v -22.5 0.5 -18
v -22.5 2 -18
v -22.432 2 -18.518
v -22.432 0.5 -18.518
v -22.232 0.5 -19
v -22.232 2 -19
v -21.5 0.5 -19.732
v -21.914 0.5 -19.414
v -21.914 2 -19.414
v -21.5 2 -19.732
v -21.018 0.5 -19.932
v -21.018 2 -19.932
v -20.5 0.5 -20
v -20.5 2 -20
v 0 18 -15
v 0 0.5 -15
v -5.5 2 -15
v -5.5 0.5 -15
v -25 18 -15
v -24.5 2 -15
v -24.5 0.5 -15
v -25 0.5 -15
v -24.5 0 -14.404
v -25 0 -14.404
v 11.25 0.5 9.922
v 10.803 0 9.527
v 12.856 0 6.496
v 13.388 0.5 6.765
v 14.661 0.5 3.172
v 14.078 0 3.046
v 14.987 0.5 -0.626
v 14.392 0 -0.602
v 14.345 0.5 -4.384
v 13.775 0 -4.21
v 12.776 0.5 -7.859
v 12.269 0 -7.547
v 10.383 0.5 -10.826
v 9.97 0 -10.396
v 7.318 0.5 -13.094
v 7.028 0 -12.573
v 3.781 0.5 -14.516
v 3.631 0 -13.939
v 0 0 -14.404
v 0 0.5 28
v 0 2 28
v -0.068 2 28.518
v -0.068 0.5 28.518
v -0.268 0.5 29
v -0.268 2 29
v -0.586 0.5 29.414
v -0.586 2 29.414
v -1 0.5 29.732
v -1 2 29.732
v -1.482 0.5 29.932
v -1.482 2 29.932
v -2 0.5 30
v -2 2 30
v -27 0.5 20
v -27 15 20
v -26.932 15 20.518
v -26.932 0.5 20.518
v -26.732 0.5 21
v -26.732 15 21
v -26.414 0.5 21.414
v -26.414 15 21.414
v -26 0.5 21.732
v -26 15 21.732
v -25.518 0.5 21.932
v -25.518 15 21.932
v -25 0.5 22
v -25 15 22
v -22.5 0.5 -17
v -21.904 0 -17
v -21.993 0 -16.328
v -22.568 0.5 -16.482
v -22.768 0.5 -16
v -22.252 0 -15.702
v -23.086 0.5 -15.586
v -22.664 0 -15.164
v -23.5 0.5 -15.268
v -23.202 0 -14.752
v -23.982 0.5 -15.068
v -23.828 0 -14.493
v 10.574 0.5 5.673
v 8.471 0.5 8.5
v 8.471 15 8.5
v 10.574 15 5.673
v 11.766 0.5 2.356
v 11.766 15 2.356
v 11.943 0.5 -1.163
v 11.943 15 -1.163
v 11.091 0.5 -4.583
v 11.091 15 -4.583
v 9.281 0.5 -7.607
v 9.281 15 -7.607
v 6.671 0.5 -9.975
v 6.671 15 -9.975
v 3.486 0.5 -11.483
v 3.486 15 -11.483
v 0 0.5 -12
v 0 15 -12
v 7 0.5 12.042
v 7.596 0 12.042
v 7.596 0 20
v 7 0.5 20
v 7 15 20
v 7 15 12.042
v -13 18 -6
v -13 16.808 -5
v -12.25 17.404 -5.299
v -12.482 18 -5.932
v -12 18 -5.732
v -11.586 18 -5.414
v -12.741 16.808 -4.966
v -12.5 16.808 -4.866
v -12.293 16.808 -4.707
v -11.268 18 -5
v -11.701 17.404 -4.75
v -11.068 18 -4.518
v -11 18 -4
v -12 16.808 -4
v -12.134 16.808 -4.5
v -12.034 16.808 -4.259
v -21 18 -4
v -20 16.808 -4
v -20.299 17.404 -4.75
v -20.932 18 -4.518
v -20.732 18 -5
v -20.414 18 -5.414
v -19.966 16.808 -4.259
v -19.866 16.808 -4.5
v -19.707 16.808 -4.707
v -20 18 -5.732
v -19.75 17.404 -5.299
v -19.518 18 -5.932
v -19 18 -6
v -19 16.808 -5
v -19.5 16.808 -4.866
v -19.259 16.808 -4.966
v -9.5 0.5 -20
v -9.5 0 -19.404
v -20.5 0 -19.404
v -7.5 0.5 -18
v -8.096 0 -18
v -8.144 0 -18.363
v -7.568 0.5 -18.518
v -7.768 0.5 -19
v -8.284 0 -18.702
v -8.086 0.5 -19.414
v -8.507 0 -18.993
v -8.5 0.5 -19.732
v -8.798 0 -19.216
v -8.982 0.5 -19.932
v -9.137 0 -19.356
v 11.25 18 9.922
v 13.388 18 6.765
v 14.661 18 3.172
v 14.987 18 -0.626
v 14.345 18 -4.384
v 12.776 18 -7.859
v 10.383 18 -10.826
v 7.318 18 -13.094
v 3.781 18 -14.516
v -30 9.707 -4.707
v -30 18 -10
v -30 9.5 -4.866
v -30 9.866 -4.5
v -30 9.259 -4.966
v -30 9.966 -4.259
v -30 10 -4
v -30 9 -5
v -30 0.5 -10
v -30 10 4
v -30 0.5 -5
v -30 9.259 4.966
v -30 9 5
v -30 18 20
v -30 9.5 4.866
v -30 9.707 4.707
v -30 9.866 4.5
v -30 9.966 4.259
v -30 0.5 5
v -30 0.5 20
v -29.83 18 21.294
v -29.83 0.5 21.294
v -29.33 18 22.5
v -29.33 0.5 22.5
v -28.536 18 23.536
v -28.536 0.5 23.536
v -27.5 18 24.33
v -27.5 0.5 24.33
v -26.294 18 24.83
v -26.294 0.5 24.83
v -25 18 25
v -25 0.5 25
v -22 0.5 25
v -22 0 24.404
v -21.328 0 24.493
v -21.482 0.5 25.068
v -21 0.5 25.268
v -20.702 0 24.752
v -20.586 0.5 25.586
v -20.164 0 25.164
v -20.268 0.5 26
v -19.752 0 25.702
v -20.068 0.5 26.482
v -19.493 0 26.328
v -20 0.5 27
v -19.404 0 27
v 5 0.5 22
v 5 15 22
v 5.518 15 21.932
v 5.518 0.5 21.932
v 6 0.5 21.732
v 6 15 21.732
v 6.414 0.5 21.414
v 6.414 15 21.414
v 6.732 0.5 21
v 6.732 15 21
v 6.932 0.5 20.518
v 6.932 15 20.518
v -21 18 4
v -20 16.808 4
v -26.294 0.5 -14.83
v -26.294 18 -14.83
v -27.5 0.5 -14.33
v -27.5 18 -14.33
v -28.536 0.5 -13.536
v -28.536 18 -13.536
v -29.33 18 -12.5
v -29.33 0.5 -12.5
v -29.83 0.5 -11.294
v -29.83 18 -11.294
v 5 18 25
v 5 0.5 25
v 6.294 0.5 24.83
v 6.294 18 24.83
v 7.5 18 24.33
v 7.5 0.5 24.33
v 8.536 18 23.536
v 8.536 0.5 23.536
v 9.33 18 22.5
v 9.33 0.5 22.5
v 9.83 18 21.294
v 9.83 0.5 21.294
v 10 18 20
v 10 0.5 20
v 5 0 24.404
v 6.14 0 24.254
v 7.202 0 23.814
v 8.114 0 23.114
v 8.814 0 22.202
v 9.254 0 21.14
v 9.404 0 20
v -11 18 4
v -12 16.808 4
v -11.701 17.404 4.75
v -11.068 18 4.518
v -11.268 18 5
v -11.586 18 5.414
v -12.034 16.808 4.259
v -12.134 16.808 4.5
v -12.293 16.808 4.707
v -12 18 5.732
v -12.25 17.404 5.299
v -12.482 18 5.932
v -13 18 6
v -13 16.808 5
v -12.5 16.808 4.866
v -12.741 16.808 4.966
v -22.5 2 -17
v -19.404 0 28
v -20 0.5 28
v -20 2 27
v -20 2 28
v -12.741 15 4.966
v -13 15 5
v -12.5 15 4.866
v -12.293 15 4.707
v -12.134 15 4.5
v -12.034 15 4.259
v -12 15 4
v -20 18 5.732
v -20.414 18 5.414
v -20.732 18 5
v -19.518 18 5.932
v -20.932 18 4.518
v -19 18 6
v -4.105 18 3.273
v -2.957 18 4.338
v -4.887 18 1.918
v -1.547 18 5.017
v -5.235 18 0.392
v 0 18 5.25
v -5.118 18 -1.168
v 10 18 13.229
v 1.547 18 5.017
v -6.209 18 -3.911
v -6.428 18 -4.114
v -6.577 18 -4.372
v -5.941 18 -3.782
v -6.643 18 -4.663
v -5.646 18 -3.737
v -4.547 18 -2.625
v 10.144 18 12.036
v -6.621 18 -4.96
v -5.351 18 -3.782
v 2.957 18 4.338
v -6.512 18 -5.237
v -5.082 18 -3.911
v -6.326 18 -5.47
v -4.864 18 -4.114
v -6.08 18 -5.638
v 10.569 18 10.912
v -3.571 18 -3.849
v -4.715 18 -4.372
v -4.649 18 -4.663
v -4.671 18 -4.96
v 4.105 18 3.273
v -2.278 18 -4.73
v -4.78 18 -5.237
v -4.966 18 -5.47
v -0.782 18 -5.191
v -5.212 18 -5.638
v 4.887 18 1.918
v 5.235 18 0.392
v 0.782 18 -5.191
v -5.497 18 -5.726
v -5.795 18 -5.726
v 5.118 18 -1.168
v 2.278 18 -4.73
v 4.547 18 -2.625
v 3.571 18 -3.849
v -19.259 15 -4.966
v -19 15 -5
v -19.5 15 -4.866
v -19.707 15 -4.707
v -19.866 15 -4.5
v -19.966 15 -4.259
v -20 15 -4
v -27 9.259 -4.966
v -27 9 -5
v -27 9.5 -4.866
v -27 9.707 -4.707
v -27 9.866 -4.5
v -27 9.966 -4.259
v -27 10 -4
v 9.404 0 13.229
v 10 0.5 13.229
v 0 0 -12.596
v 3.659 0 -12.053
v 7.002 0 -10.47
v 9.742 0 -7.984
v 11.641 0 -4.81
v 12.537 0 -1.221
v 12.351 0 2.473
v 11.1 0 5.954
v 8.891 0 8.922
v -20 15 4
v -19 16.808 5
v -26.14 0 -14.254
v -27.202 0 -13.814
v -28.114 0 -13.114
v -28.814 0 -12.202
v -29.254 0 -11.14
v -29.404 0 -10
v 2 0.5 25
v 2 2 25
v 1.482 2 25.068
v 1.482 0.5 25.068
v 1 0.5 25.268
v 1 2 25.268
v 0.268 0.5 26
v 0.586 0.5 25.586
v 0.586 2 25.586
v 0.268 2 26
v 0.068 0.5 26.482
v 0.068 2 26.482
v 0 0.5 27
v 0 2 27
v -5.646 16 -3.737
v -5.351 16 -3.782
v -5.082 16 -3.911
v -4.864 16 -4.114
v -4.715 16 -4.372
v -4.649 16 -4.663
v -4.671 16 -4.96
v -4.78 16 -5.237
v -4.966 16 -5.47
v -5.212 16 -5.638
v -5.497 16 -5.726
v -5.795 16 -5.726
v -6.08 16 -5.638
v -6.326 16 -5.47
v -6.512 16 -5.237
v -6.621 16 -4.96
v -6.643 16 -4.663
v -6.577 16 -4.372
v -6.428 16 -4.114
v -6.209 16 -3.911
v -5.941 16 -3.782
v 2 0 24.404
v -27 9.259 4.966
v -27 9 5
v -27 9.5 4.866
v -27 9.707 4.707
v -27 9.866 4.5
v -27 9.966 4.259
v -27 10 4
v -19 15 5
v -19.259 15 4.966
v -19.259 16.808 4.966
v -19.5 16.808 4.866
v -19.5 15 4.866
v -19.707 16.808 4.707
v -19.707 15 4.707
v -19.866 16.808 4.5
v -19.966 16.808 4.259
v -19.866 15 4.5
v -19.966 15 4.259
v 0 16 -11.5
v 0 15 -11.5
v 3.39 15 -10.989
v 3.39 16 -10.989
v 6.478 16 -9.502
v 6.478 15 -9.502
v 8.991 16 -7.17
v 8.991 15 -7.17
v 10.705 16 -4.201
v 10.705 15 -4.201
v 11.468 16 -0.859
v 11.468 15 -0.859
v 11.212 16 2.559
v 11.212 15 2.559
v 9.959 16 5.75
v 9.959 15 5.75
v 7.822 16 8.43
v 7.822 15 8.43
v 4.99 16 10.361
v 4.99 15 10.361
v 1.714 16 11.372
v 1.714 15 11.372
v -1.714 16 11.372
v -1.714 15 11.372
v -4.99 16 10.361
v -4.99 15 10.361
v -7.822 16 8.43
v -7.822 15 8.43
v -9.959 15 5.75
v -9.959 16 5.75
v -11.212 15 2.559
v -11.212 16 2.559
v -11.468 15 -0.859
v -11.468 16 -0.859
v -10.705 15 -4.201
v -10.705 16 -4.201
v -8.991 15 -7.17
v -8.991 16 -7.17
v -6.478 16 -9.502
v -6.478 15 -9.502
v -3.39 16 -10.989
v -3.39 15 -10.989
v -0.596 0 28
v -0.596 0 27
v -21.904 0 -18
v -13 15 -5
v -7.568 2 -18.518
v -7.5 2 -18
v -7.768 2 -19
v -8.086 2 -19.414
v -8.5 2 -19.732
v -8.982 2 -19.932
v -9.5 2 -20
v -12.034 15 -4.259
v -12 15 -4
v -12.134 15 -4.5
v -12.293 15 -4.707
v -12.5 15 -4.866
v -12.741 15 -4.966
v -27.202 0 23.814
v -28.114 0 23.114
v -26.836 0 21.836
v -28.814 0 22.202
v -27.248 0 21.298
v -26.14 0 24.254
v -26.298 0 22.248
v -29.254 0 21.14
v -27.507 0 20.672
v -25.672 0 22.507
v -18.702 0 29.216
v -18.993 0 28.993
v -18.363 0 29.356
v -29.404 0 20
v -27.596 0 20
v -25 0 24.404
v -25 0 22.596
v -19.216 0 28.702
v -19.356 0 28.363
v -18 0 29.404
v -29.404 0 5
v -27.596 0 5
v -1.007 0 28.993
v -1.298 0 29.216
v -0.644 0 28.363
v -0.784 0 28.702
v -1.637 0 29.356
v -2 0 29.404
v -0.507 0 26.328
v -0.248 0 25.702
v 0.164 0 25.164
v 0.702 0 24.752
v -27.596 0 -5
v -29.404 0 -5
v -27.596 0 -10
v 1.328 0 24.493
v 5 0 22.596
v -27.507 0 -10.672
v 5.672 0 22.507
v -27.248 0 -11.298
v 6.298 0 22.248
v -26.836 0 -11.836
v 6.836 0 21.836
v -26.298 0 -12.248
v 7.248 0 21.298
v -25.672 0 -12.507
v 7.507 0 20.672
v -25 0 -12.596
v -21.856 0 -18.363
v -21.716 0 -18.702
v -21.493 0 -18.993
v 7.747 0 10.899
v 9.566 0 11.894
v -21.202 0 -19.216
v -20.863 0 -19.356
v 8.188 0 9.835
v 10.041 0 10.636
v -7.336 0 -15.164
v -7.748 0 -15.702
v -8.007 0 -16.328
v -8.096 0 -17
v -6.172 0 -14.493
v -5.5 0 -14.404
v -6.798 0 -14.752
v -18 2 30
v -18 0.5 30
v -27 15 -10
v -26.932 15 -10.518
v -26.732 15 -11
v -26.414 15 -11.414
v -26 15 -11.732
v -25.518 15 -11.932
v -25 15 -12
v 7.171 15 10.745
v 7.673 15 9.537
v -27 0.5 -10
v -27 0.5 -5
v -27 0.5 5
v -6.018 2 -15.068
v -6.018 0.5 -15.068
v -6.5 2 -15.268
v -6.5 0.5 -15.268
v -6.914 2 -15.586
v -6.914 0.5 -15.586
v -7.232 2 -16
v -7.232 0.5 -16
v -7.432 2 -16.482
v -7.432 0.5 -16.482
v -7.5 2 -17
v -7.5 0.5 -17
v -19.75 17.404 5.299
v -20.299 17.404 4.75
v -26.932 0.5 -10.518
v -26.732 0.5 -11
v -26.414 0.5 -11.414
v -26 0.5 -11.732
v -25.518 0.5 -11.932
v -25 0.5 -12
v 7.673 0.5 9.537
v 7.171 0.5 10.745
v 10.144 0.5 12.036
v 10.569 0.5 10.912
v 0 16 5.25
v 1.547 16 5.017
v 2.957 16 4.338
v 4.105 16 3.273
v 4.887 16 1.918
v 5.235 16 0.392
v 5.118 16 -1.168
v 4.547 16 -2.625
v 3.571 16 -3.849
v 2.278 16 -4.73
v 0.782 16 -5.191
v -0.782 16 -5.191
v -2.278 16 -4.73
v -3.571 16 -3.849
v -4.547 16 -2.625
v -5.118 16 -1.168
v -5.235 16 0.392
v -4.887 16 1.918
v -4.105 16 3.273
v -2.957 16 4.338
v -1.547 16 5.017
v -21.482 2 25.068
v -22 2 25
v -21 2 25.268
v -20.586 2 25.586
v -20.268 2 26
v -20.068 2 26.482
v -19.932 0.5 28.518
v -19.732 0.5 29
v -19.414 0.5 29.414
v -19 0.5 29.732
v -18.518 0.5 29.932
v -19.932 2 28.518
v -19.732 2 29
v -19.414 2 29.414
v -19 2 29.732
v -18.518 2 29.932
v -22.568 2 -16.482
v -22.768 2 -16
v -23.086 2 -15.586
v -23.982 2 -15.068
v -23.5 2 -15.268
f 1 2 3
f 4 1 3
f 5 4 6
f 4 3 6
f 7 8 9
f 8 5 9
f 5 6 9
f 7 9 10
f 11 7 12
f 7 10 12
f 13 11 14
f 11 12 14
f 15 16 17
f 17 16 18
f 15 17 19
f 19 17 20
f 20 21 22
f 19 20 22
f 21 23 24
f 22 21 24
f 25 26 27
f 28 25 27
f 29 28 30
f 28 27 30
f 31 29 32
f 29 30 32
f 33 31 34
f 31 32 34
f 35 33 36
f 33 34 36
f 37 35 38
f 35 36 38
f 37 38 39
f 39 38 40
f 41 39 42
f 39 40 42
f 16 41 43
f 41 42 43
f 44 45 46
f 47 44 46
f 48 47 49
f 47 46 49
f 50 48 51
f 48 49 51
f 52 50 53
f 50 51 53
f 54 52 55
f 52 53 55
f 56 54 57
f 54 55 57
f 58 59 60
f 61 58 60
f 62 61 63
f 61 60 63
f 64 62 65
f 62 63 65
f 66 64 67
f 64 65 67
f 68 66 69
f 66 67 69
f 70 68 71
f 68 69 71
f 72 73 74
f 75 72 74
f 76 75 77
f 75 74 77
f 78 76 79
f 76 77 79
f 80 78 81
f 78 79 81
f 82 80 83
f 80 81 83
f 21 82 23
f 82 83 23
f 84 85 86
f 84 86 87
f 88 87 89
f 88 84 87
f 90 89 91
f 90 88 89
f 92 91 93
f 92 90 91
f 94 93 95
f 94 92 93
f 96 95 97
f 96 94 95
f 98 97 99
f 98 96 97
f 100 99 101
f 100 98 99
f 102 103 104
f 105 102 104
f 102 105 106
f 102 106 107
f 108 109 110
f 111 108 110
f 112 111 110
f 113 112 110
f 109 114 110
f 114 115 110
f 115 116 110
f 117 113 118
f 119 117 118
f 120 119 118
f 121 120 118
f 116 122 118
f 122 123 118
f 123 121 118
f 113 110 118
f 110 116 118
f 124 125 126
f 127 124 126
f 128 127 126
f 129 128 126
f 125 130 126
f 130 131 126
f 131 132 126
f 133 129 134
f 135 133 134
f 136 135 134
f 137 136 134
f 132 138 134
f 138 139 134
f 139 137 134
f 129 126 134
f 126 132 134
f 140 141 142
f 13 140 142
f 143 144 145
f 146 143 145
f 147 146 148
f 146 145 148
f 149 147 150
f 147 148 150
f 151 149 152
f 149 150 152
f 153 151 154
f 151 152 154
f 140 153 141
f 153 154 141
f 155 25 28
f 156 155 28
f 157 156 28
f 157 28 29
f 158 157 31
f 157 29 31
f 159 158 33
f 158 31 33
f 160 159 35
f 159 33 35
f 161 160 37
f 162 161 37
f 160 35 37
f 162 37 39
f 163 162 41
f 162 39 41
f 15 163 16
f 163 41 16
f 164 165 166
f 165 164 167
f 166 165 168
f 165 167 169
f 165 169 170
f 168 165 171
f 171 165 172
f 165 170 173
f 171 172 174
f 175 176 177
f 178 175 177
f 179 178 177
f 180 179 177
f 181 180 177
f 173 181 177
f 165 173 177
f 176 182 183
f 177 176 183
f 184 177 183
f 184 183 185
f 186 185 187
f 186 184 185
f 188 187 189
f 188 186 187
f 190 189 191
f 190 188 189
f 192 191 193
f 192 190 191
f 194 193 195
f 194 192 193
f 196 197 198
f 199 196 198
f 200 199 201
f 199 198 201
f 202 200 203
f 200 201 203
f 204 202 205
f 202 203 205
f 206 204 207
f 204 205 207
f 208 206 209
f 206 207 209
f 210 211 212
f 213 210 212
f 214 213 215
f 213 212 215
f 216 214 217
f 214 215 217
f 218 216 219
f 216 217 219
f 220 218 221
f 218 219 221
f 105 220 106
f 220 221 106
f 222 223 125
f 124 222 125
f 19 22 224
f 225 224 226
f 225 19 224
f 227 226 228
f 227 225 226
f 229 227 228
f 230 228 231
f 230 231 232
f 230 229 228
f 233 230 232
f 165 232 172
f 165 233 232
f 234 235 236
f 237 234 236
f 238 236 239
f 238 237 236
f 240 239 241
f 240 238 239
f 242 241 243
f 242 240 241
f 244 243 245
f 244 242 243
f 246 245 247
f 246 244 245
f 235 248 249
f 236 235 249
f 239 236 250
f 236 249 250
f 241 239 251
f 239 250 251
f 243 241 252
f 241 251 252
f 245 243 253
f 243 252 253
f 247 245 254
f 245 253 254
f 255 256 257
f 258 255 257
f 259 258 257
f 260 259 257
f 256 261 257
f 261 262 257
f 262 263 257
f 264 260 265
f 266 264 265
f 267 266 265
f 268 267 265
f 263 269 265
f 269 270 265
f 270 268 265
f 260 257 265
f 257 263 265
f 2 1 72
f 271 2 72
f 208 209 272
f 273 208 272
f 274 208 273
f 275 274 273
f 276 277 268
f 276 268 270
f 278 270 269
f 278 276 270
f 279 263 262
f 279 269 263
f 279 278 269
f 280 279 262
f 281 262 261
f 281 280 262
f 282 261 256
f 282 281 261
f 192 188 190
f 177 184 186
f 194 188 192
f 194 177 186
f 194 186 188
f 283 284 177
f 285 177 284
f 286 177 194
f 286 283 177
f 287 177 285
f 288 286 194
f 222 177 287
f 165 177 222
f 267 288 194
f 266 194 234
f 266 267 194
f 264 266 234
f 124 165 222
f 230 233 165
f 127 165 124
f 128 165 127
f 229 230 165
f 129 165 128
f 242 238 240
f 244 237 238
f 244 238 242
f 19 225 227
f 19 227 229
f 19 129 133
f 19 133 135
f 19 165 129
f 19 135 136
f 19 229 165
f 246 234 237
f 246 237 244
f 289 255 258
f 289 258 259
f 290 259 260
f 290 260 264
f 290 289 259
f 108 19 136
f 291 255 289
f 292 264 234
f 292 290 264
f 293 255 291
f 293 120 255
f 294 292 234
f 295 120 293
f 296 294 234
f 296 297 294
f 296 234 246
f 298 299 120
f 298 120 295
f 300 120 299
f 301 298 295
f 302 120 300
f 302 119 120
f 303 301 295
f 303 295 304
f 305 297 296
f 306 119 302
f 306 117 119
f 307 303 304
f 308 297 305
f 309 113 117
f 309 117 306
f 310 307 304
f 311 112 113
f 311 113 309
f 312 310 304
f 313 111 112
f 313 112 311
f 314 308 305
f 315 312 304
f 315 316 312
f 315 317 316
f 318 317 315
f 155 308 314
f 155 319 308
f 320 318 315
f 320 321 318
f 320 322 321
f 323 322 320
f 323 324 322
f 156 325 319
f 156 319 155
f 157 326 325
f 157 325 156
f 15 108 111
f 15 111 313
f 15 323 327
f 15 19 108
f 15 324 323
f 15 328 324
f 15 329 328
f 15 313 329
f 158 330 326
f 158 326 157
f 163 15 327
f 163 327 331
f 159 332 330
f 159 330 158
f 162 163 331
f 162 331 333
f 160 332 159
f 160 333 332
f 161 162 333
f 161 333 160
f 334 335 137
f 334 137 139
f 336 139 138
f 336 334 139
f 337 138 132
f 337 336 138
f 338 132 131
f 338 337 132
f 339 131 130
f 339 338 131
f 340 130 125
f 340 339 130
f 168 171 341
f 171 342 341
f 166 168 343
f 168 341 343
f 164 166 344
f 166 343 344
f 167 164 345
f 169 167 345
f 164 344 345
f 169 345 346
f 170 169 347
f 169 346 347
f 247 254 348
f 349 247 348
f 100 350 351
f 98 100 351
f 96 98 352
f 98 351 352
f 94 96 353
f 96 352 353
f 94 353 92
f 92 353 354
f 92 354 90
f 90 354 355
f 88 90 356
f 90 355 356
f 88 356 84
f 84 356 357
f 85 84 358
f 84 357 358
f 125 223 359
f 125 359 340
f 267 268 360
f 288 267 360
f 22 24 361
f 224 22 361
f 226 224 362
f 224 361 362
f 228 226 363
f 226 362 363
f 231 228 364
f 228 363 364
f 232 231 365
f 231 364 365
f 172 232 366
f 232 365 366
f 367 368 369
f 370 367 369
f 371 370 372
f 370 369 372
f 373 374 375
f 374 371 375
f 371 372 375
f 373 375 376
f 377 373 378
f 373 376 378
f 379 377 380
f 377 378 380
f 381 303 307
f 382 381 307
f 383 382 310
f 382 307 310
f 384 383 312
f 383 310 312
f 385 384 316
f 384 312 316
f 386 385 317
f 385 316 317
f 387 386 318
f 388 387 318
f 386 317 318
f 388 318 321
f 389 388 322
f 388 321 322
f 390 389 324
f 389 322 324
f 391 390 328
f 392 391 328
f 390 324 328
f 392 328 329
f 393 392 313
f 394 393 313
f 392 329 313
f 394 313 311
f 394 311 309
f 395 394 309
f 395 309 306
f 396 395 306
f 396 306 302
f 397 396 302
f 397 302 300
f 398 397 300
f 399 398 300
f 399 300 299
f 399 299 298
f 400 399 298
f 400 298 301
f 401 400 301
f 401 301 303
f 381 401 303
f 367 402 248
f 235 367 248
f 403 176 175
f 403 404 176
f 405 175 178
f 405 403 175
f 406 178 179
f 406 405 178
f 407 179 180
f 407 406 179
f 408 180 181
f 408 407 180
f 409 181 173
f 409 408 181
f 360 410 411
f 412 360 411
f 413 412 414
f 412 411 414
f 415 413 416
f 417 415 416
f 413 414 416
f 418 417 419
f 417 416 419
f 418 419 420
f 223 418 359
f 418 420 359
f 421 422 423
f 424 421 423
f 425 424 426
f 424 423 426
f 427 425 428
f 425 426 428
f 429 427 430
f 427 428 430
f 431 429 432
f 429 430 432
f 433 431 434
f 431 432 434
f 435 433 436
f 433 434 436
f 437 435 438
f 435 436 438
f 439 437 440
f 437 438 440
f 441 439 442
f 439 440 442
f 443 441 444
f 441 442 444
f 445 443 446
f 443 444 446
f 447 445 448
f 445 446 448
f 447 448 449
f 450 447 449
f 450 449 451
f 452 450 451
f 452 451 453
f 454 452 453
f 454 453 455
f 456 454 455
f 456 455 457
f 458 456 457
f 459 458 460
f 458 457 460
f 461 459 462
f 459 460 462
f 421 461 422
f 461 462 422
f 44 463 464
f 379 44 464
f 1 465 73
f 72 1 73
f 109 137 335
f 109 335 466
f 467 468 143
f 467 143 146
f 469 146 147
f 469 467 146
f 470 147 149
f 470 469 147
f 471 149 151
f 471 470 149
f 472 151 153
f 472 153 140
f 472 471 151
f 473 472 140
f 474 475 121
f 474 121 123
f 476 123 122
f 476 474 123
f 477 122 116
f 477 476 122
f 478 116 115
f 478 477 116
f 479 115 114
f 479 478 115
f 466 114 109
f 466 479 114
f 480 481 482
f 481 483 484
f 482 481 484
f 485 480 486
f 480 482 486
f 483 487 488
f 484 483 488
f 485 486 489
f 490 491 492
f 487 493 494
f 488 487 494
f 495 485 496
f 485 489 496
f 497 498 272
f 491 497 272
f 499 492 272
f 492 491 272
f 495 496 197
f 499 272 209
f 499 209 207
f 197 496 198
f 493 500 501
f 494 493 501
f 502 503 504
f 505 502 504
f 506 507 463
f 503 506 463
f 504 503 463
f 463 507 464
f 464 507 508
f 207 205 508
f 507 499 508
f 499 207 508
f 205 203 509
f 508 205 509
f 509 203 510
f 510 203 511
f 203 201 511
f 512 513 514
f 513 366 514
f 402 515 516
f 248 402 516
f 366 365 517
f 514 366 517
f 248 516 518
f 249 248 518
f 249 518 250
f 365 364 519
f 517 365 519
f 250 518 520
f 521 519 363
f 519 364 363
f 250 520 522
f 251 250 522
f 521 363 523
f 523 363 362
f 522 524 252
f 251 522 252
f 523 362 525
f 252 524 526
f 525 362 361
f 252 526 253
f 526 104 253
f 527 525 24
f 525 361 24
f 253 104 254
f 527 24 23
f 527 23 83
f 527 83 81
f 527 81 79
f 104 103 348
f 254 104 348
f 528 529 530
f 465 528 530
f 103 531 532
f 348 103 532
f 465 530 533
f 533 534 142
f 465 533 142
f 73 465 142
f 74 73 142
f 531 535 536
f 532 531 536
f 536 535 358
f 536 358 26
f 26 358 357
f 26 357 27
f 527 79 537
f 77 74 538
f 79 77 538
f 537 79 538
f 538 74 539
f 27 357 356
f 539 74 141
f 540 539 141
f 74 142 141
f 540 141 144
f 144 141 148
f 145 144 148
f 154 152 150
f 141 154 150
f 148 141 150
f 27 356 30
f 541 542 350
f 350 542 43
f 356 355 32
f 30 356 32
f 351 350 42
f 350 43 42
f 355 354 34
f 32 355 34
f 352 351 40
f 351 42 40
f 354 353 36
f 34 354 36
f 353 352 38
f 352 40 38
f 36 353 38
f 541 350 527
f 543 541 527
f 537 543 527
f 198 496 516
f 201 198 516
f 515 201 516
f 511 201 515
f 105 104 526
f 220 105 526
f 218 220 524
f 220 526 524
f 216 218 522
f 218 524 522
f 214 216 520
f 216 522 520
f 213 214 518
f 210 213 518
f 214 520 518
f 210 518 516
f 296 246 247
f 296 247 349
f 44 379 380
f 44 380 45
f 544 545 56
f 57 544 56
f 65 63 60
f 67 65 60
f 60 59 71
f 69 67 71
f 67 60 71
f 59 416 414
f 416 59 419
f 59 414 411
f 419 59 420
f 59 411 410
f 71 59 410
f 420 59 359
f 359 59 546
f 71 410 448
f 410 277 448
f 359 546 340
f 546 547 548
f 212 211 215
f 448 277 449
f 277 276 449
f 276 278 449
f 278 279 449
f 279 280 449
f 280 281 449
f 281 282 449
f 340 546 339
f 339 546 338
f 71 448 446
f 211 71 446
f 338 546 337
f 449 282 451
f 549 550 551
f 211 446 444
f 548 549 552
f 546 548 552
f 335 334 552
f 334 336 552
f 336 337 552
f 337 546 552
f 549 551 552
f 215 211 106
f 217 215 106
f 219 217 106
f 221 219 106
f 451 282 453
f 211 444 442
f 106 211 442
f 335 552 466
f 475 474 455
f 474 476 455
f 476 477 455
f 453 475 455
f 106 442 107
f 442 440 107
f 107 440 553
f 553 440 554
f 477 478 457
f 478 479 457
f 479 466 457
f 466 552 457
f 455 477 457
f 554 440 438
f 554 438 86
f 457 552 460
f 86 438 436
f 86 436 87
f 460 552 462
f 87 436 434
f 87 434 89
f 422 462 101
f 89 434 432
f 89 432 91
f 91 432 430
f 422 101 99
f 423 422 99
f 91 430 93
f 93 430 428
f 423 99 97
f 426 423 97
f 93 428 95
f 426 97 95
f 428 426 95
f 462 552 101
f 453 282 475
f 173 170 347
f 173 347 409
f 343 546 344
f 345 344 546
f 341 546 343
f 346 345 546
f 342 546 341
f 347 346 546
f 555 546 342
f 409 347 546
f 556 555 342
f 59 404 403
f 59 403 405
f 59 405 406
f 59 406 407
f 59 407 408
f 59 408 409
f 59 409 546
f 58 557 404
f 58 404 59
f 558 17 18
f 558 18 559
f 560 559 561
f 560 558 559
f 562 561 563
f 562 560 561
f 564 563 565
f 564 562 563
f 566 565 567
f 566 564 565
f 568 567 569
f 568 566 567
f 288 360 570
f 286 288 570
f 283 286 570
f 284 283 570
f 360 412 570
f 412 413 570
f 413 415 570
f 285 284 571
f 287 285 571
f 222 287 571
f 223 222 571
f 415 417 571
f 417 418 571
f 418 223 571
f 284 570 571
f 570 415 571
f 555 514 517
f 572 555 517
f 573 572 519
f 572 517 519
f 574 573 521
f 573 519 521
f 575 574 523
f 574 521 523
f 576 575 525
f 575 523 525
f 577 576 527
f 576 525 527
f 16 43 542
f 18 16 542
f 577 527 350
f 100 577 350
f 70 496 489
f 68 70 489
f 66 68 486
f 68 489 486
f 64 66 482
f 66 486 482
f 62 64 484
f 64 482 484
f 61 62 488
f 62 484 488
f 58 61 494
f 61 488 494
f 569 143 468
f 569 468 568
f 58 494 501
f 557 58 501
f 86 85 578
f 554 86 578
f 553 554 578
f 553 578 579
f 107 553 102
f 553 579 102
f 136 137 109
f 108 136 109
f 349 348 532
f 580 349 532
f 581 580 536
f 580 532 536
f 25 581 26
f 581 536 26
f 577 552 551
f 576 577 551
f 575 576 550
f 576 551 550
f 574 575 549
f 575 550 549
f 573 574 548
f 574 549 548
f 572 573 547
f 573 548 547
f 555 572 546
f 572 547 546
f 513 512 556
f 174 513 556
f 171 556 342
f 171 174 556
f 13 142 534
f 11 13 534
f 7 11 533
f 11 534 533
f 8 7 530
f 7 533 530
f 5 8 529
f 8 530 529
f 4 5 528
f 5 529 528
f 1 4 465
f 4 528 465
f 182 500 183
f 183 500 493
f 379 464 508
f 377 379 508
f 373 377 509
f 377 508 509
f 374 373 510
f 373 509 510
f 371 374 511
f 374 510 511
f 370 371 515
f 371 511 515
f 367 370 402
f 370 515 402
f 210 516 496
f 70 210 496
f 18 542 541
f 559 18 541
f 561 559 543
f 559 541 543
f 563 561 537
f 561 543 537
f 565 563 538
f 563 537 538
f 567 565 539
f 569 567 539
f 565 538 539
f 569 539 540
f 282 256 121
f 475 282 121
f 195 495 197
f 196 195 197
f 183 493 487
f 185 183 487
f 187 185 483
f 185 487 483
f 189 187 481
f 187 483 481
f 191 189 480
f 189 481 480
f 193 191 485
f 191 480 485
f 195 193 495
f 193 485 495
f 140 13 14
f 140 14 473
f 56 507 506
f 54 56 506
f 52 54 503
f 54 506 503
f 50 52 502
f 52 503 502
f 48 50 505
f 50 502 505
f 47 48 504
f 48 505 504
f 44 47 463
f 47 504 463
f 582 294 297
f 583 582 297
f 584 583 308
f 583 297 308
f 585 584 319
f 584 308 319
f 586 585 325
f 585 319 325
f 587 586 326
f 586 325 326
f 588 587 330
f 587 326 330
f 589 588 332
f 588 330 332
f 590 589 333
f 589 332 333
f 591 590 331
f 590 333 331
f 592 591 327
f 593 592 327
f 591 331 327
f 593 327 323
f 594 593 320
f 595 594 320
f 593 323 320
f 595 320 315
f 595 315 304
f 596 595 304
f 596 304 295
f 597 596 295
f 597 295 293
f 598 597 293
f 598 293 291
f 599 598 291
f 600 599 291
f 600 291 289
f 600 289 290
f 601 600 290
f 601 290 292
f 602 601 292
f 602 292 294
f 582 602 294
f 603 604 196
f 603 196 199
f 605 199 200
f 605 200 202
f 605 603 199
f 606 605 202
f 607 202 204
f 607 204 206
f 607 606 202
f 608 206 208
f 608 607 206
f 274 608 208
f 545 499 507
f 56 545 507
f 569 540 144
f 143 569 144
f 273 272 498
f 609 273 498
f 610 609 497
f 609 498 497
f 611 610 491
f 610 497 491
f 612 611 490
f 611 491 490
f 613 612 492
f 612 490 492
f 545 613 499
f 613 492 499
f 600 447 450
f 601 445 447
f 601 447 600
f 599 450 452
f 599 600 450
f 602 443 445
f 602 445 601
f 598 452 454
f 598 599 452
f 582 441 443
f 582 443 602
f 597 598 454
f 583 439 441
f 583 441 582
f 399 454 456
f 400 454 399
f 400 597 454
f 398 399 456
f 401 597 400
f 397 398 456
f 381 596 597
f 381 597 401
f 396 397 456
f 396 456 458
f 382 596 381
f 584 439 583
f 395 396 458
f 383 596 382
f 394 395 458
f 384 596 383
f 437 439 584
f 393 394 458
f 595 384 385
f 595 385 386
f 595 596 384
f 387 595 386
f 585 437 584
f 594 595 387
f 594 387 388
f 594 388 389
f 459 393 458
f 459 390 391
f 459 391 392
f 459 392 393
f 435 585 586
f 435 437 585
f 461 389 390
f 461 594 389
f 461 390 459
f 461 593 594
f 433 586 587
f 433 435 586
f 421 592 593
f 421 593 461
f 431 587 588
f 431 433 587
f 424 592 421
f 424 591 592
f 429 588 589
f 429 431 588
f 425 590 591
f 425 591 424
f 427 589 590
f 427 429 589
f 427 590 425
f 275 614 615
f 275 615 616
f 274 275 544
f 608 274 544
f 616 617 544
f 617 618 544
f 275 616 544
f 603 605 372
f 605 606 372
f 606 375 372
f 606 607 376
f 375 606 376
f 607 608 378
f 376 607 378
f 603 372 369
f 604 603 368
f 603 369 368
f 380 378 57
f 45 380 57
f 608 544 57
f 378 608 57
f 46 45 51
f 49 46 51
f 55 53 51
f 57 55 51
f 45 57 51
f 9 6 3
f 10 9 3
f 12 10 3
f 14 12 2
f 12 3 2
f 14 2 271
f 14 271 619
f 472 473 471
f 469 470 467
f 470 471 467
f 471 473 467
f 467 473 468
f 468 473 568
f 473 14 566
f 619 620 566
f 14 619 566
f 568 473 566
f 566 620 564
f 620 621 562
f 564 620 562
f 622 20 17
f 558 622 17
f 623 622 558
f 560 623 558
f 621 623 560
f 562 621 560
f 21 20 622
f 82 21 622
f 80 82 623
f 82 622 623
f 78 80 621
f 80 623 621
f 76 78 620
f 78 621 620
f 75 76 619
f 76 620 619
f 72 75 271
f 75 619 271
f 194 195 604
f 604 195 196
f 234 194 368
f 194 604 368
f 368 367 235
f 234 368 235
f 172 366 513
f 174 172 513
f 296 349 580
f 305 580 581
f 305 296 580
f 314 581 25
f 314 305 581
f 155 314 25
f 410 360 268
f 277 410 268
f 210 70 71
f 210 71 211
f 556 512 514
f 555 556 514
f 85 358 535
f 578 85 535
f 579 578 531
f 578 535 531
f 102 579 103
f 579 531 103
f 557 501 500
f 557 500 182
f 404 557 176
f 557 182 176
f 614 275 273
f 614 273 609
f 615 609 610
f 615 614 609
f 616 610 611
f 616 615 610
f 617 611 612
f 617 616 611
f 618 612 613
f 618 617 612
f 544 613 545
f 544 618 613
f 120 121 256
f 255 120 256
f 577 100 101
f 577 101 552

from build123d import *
from OCP.BRepFilletAPI import BRepFilletAPI_MakeChamfer

# Parameters (mm, degrees)
BOSS_EXTRUDE1_DEPTH = 18
FILLET1_R           = 5
SHELL1_T            = -3
SKETCH3_R           = 5.25
CUT_EXTRUDE1_DEPTH  = 44
SKETCH4_R           = 11.5
CUT_EXTRUDE2_DEPTH  = 1
SKETCH5_R           = 1
CUT_EXTRUDE3_DEPTH  = 44
CUT_EXTRUDE4_REACH  = 56.534
SKETCH6_W           = 10
SKETCH6_H           = 10
FILLET2_R           = 1
CUT_EXTRUDE7_REACH  = 45
SKETCH7_W           = 8
SKETCH7_H           = 10
FILLET3_R           = 1
SKETCH8_W           = 20
SKETCH8_H           = 5
SKETCH8_W_2         = 15
BOSS_EXTRUDE2_DEPTH = 2
FILLET4_R           = 2
FILLET5_R           = 5
FILLET6_R           = 5
CHAMFER2_SIZE       = 1
CHAMFER2_SIZE2      = 1.191753593
CHAMFER3_SIZE       = 0.5
CHAMFER3_SIZE2      = 0.595876796


with BuildPart() as part:
    # Sketch1 → Boss-Extrude1 (new body)
    with BuildSketch(Plane(origin=(0, 0, 0), x_dir=(1, 0, 0), z_dir=(0, 1, 0))):
        with BuildLine():
            Line((0, 15), (-30, 15))
            Line((-30, 15), (-30, -25))
            Line((-30, -25), (10, -25))
            Line((10, -25), (10, -11.180339887))
            ThreePointArc((10, -11.180339887), (14.012585384, 5.352331347), (0, 15))
        make_face()
    extrude(amount=BOSS_EXTRUDE1_DEPTH)

    # Fillet1
    fillet1_edges = [part.edges().sort_by_distance(p)[0] for p in [
        (10, 9, 25),
        (-30, 9, 25),
        (-30, 9, -15),
    ]]
    fillet(fillet1_edges, radius=FILLET1_R)

    # Shell1
    shell1_openings = [part.faces().sort_by_distance(p)[0] for p in [
        (-9.03204336, 0, 4.841264845),
    ]]
    offset(amount=SHELL1_T, openings=shell1_openings, kind=Kind.INTERSECTION)

    # Sketch3 → Cut-Extrude1 (cut, through all)
    with BuildSketch(Plane(origin=(0, 18, 0), x_dir=(1, 0, 0), z_dir=(0, 1, 0))):
        with Locations(Location((0, 0, 0), (0, 0, 270))):
            Circle(SKETCH3_R)
    extrude(amount=-CUT_EXTRUDE1_DEPTH, mode=Mode.SUBTRACT)

    # Sketch4 → Cut-Extrude2 (cut)
    with BuildSketch(Plane.XZ.offset(-15)):
        with Locations(Location((0, 0, 0), (0, 0, 270))):
            Circle(SKETCH4_R)
    extrude(amount=-CUT_EXTRUDE2_DEPTH, mode=Mode.SUBTRACT)

    # Sketch5 → Cut-Extrude3 (cut, through all)
    with BuildSketch(Plane(origin=(0, 18, 0), x_dir=(1, 0, 0), z_dir=(0, 1, 0))):
        with Locations(Location((-5.645747546, 4.737344683, 0), (0, 0, 270))):
            Circle(SKETCH5_R)
    extrude(amount=-CUT_EXTRUDE3_DEPTH, mode=Mode.SUBTRACT)

    # Sketch6 → Cut-Extrude4 (cut, up to next)
    with BuildSketch(Plane.ZY.offset(30), mode=Mode.PRIVATE) as cut_extrude4_sk1:
        with Locations((0, 5)):
            Rectangle(SKETCH6_W, SKETCH6_H)
    cut_extrude4_tool1 = extrude(cut_extrude4_sk1.sketch, amount=-CUT_EXTRUDE4_REACH, mode=Mode.PRIVATE) & part.part
    add(cut_extrude4_tool1.solids().sort_by_distance((-30, 5, 0))[0], mode=Mode.SUBTRACT)

    # Fillet2
    fillet2_edges = [part.edges().sort_by_distance(p)[0] for p in [
        (-28.5, 10, 5),
        (-28.5, 10, -5),
    ]]
    fillet(fillet2_edges, radius=FILLET2_R)

    # Sketch7 → Cut-Extrude7 (cut, up to next)
    with BuildSketch(Plane(origin=(0, 18, 0), x_dir=(1, 0, 0), z_dir=(0, 1, 0)), mode=Mode.PRIVATE) as cut_extrude7_sk1:
        with Locations((-16, 0)):
            Rectangle(SKETCH7_W, SKETCH7_H)
    cut_extrude7_tool1 = extrude(cut_extrude7_sk1.sketch, amount=-CUT_EXTRUDE7_REACH, mode=Mode.PRIVATE) & part.part
    add(cut_extrude7_tool1.solids().sort_by_distance((-16, 18, 0))[0], mode=Mode.SUBTRACT)

    # Fillet3
    fillet3_edges = [part.edges().sort_by_distance(p)[0] for p in [
        (-20, 16.5, 5),
        (-20, 16.5, -5),
        (-12, 16.5, -5),
        (-12, 16.5, 5),
    ]]
    fillet(fillet3_edges, radius=FILLET3_R)

    # Sketch8 → Boss-Extrude2 (add)
    with BuildSketch(Plane.XZ):
        with Locations((-10, 27.5)):
            Rectangle(SKETCH8_W, SKETCH8_H)
        with Locations((-15, -17.5)):
            Rectangle(SKETCH8_W_2, SKETCH8_H)
    extrude(amount=-BOSS_EXTRUDE2_DEPTH)

    # Fillet4
    fillet4_edges = [part.edges().sort_by_distance(p)[0] for p in [
        (-20, 1, 25),
        (-20, 1, 30),
        (0, 1, 30),
        (0, 1, 25),
        (-22.5, 1, -20),
        (-22.5, 1, -15),
        (-7.5, 1, -15),
        (-7.5, 1, -20),
    ]]
    fillet(fillet4_edges, radius=FILLET4_R)

    # Fillet5
    fillet5_edges = [part.edges().sort_by_distance(p)[0] for p in [
        (10, 9, 11.180339887),
    ]]
    fillet(fillet5_edges, radius=FILLET5_R)

    # Fillet6
    fillet6_edges = [part.edges().sort_by_distance(p)[0] for p in [
        (7, 7.5, 9.746794345),
    ]]
    fillet(fillet6_edges, radius=FILLET6_R)

    # Chamfer2
    chamfer2_edges = [part.edges().sort_by_distance(p)[0] for p in [
        (-16, 18, -5),
        (-12, 18, 0),
        (-16, 18, 5),
        (-20, 18, 0),
        (-12.292893219, 18, -4.707106781),
        (-12.292893219, 18, 4.707106781),
        (-19.707106781, 18, 4.707106781),
        (-19.707106781, 18, -4.707106781),
    ]]
    chamfer2_side = [part.faces().sort_by_distance(p)[0] for p in [
        (-9.188665207, 18, 5.405494126),
    ]]
    chamfer(chamfer2_edges, length=CHAMFER2_SIZE, length2=CHAMFER2_SIZE2, reference=chamfer2_side[0])

    # Chamfer3: one chamfer whose edges measure the first distance from different faces: ONE call of the kernel's chamfer builder (chamfer() names one face for all edges)
    chamfer3_edges_1 = [part.edges().sort_by_distance(p)[0] for p in [
        (10, 0, 16.614378278),
    ]]
    chamfer3_side_1 = [part.faces().sort_by_distance(p)[0] for p in [
        (10, 9, 16.614378278),
    ]]
    chamfer3_edges_2 = [part.edges().sort_by_distance(p)[0] for p in [
        (-22.5, 0, -17.5),
    ]]
    chamfer3_side_2 = [part.faces().sort_by_distance(p)[0] for p in [
        (-22.5, 1, -17.5),
    ]]
    chamfer3_edges_3 = [part.edges().sort_by_distance(p)[0] for p in [
        (-24.75, 0, -15),
        (-2.75, 0, -15),
    ]]
    chamfer3_side_3 = [part.faces().sort_by_distance(p)[0] for p in [
        (-12.269417476, 9.737864078, -15),
    ]]
    chamfer3_edges_4 = [part.edges().sort_by_distance(p)[0] for p in [
        (-15, 0, -20),
    ]]
    chamfer3_side_4 = [part.faces().sort_by_distance(p)[0] for p in [
        (-15, 1, -20),
    ]]
    chamfer3_edges_5 = [part.edges().sort_by_distance(p)[0] for p in [
        (-7.5, 0, -17.5),
    ]]
    chamfer3_side_5 = [part.faces().sort_by_distance(p)[0] for p in [
        (-7.5, 1, -17.5),
    ]]
    chamfer3_edges_6 = [part.edges().sort_by_distance(p)[0] for p in [
        (3.5, 0, 25),
        (-23.5, 0, 25),
    ]]
    chamfer3_side_6 = [part.faces().sort_by_distance(p)[0] for p in [
        (-10, 9.780487805, 25),
    ]]
    chamfer3_edges_7 = [part.edges().sort_by_distance(p)[0] for p in [
        (0, 0, 27.5),
    ]]
    chamfer3_side_7 = [part.faces().sort_by_distance(p)[0] for p in [
        (0, 1, 27.5),
    ]]
    chamfer3_edges_8 = [part.edges().sort_by_distance(p)[0] for p in [
        (-10, 0, 30),
    ]]
    chamfer3_side_8 = [part.faces().sort_by_distance(p)[0] for p in [
        (-10, 1, 30),
    ]]
    chamfer3_edges_9 = [part.edges().sort_by_distance(p)[0] for p in [
        (-20, 0, 27.5),
    ]]
    chamfer3_side_9 = [part.faces().sort_by_distance(p)[0] for p in [
        (-20, 1, 27.5),
    ]]
    chamfer3_edges_10 = [part.edges().sort_by_distance(p)[0] for p in [
        (-19.414213562, 0, 29.414213562),
    ]]
    chamfer3_side_10 = [part.faces().sort_by_distance(p)[0] for p in [
        (-19.414213562, 1, 29.414213562),
    ]]
    chamfer3_edges_11 = [part.edges().sort_by_distance(p)[0] for p in [
        (-0.585786438, 0, 29.414213562),
    ]]
    chamfer3_side_11 = [part.faces().sort_by_distance(p)[0] for p in [
        (-0.585786438, 1, 29.414213562),
    ]]
    chamfer3_edges_12 = [part.edges().sort_by_distance(p)[0] for p in [
        (-8.085786438, 0, -19.414213562),
    ]]
    chamfer3_side_12 = [part.faces().sort_by_distance(p)[0] for p in [
        (-8.085786438, 1, -19.414213562),
    ]]
    chamfer3_edges_13 = [part.edges().sort_by_distance(p)[0] for p in [
        (-21.914213562, 0, -19.414213562),
    ]]
    chamfer3_side_13 = [part.faces().sort_by_distance(p)[0] for p in [
        (-21.914213562, 1, -19.414213562),
    ]]
    chamfer3_edges_14 = [part.edges().sort_by_distance(p)[0] for p in [
        (-30, 0, -7.5),
        (-30, 0, 12.5),
    ]]
    chamfer3_side_14 = [part.faces().sort_by_distance(p)[0] for p in [
        (-30, 9.908961826, 6.130383675),
    ]]
    chamfer3_edges_15 = [part.edges().sort_by_distance(p)[0] for p in [
        (-28.535533906, 0, -13.535533906),
    ]]
    chamfer3_side_15 = [part.faces().sort_by_distance(p)[0] for p in [
        (-28.535533906, 9, -13.535533906),
    ]]
    chamfer3_edges_16 = [part.edges().sort_by_distance(p)[0] for p in [
        (-23.085786438, 0, -15.585786438),
    ]]
    chamfer3_side_16 = [part.faces().sort_by_distance(p)[0] for p in [
        (-23.085786438, 1, -15.585786438),
    ]]
    chamfer3_edges_17 = [part.edges().sort_by_distance(p)[0] for p in [
        (-28.535533906, 0, 23.535533906),
    ]]
    chamfer3_side_17 = [part.faces().sort_by_distance(p)[0] for p in [
        (-28.535533906, 9, 23.535533906),
    ]]
    chamfer3_edges_18 = [part.edges().sort_by_distance(p)[0] for p in [
        (-6.914213562, 0, -15.585786438),
    ]]
    chamfer3_side_18 = [part.faces().sort_by_distance(p)[0] for p in [
        (-6.914213562, 1, -15.585786438),
    ]]
    chamfer3_edges_19 = [part.edges().sort_by_distance(p)[0] for p in [
        (0.585786438, 0, 25.585786438),
    ]]
    chamfer3_side_19 = [part.faces().sort_by_distance(p)[0] for p in [
        (0.585786438, 1, 25.585786438),
    ]]
    chamfer3_edges_20 = [part.edges().sort_by_distance(p)[0] for p in [
        (-20.585786438, 0, 25.585786438),
    ]]
    chamfer3_side_20 = [part.faces().sort_by_distance(p)[0] for p in [
        (-20.585786438, 1, 25.585786438),
    ]]
    chamfer3_edges_21 = [part.edges().sort_by_distance(p)[0] for p in [
        (8.535533906, 0, 23.535533906),
    ]]
    chamfer3_side_21 = [part.faces().sort_by_distance(p)[0] for p in [
        (8.535533906, 9, 23.535533906),
    ]]
    chamfer3_edges_22 = [part.edges().sort_by_distance(p)[0] for p in [
        (13.671567416, 0, -6.171567416),
    ]]
    chamfer3_side_22 = [part.faces().sort_by_distance(p)[0] for p in [
        (13.671567416, 9, -6.171567416),
    ]]
    chamfer3_edges_23 = [part.edges().sort_by_distance(p)[0] for p in [
        (10.322928267, 0, 11.460989602),
    ]]
    chamfer3_side_23 = [part.faces().sort_by_distance(p)[0] for p in [
        (10.322928267, 9, 11.460989602),
    ]]
    chamfer3_edges_24 = [part.edges().sort_by_distance(p)[0] for p in [
        (11.090522742, 0, -4.582609007),
    ]]
    chamfer3_side_24 = [part.faces().sort_by_distance(p)[0] for p in [
        (11.090522742, 7.5, -4.582609007),
    ]]
    chamfer3_edges_25 = [part.edges().sort_by_distance(p)[0] for p in [
        (7.382259274, 0, 10.124182107),
    ]]
    chamfer3_side_25 = [part.faces().sort_by_distance(p)[0] for p in [
        (7.382259274, 7.5, 10.124182107),
    ]]
    chamfer3_edges_26 = [part.edges().sort_by_distance(p)[0] for p in [
        (-12.5, 0, -12),
    ]]
    chamfer3_side_26 = [part.faces().sort_by_distance(p)[0] for p in [
        (-12.5, 7.5, -12),
    ]]
    chamfer3_edges_27 = [part.edges().sort_by_distance(p)[0] for p in [
        (-27, 0, -7.5),
        (-27, 0, 12.5),
    ]]
    chamfer3_side_27 = [part.faces().sort_by_distance(p)[0] for p in [
        (-27, 8.216199267, 6.420697751),
    ]]
    chamfer3_edges_28 = [part.edges().sort_by_distance(p)[0] for p in [
        (-10, 0, 22),
    ]]
    chamfer3_side_28 = [part.faces().sort_by_distance(p)[0] for p in [
        (-10, 7.5, 22),
    ]]
    chamfer3_edges_29 = [part.edges().sort_by_distance(p)[0] for p in [
        (7, 0, 16.020797289),
    ]]
    chamfer3_side_29 = [part.faces().sort_by_distance(p)[0] for p in [
        (7, 7.5, 16.020797289),
    ]]
    chamfer3_edges_30 = [part.edges().sort_by_distance(p)[0] for p in [
        (6.414213562, 0, 21.414213562),
    ]]
    chamfer3_side_30 = [part.faces().sort_by_distance(p)[0] for p in [
        (6.414213562, 7.5, 21.414213562),
    ]]
    chamfer3_edges_31 = [part.edges().sort_by_distance(p)[0] for p in [
        (-26.414213562, 0, 21.414213562),
    ]]
    chamfer3_side_31 = [part.faces().sort_by_distance(p)[0] for p in [
        (-26.414213562, 7.5, 21.414213562),
    ]]
    chamfer3_edges_32 = [part.edges().sort_by_distance(p)[0] for p in [
        (-26.414213562, 0, -11.414213562),
    ]]
    chamfer3_side_32 = [part.faces().sort_by_distance(p)[0] for p in [
        (-26.414213562, 7.5, -11.414213562),
    ]]
    chamfer3 = BRepFilletAPI_MakeChamfer(part.part.solid().wrapped)
    for e in chamfer3_edges_1:
        chamfer3.Add(CHAMFER3_SIZE, CHAMFER3_SIZE2, e.wrapped, chamfer3_side_1[0].wrapped)  # the first distance lies on this face
    for e in chamfer3_edges_2:
        chamfer3.Add(CHAMFER3_SIZE, CHAMFER3_SIZE2, e.wrapped, chamfer3_side_2[0].wrapped)  # the first distance lies on this face
    for e in chamfer3_edges_3:
        chamfer3.Add(CHAMFER3_SIZE, CHAMFER3_SIZE2, e.wrapped, chamfer3_side_3[0].wrapped)  # the first distance lies on this face
    for e in chamfer3_edges_4:
        chamfer3.Add(CHAMFER3_SIZE, CHAMFER3_SIZE2, e.wrapped, chamfer3_side_4[0].wrapped)  # the first distance lies on this face
    for e in chamfer3_edges_5:
        chamfer3.Add(CHAMFER3_SIZE, CHAMFER3_SIZE2, e.wrapped, chamfer3_side_5[0].wrapped)  # the first distance lies on this face
    for e in chamfer3_edges_6:
        chamfer3.Add(CHAMFER3_SIZE, CHAMFER3_SIZE2, e.wrapped, chamfer3_side_6[0].wrapped)  # the first distance lies on this face
    for e in chamfer3_edges_7:
        chamfer3.Add(CHAMFER3_SIZE, CHAMFER3_SIZE2, e.wrapped, chamfer3_side_7[0].wrapped)  # the first distance lies on this face
    for e in chamfer3_edges_8:
        chamfer3.Add(CHAMFER3_SIZE, CHAMFER3_SIZE2, e.wrapped, chamfer3_side_8[0].wrapped)  # the first distance lies on this face
    for e in chamfer3_edges_9:
        chamfer3.Add(CHAMFER3_SIZE, CHAMFER3_SIZE2, e.wrapped, chamfer3_side_9[0].wrapped)  # the first distance lies on this face
    for e in chamfer3_edges_10:
        chamfer3.Add(CHAMFER3_SIZE, CHAMFER3_SIZE2, e.wrapped, chamfer3_side_10[0].wrapped)  # the first distance lies on this face
    for e in chamfer3_edges_11:
        chamfer3.Add(CHAMFER3_SIZE, CHAMFER3_SIZE2, e.wrapped, chamfer3_side_11[0].wrapped)  # the first distance lies on this face
    for e in chamfer3_edges_12:
        chamfer3.Add(CHAMFER3_SIZE, CHAMFER3_SIZE2, e.wrapped, chamfer3_side_12[0].wrapped)  # the first distance lies on this face
    for e in chamfer3_edges_13:
        chamfer3.Add(CHAMFER3_SIZE, CHAMFER3_SIZE2, e.wrapped, chamfer3_side_13[0].wrapped)  # the first distance lies on this face
    for e in chamfer3_edges_14:
        chamfer3.Add(CHAMFER3_SIZE, CHAMFER3_SIZE2, e.wrapped, chamfer3_side_14[0].wrapped)  # the first distance lies on this face
    for e in chamfer3_edges_15:
        chamfer3.Add(CHAMFER3_SIZE, CHAMFER3_SIZE2, e.wrapped, chamfer3_side_15[0].wrapped)  # the first distance lies on this face
    for e in chamfer3_edges_16:
        chamfer3.Add(CHAMFER3_SIZE, CHAMFER3_SIZE2, e.wrapped, chamfer3_side_16[0].wrapped)  # the first distance lies on this face
    for e in chamfer3_edges_17:
        chamfer3.Add(CHAMFER3_SIZE, CHAMFER3_SIZE2, e.wrapped, chamfer3_side_17[0].wrapped)  # the first distance lies on this face
    for e in chamfer3_edges_18:
        chamfer3.Add(CHAMFER3_SIZE, CHAMFER3_SIZE2, e.wrapped, chamfer3_side_18[0].wrapped)  # the first distance lies on this face
    for e in chamfer3_edges_19:
        chamfer3.Add(CHAMFER3_SIZE, CHAMFER3_SIZE2, e.wrapped, chamfer3_side_19[0].wrapped)  # the first distance lies on this face
    for e in chamfer3_edges_20:
        chamfer3.Add(CHAMFER3_SIZE, CHAMFER3_SIZE2, e.wrapped, chamfer3_side_20[0].wrapped)  # the first distance lies on this face
    for e in chamfer3_edges_21:
        chamfer3.Add(CHAMFER3_SIZE, CHAMFER3_SIZE2, e.wrapped, chamfer3_side_21[0].wrapped)  # the first distance lies on this face
    for e in chamfer3_edges_22:
        chamfer3.Add(CHAMFER3_SIZE, CHAMFER3_SIZE2, e.wrapped, chamfer3_side_22[0].wrapped)  # the first distance lies on this face
    for e in chamfer3_edges_23:
        chamfer3.Add(CHAMFER3_SIZE, CHAMFER3_SIZE2, e.wrapped, chamfer3_side_23[0].wrapped)  # the first distance lies on this face
    for e in chamfer3_edges_24:
        chamfer3.Add(CHAMFER3_SIZE, CHAMFER3_SIZE2, e.wrapped, chamfer3_side_24[0].wrapped)  # the first distance lies on this face
    for e in chamfer3_edges_25:
        chamfer3.Add(CHAMFER3_SIZE, CHAMFER3_SIZE2, e.wrapped, chamfer3_side_25[0].wrapped)  # the first distance lies on this face
    for e in chamfer3_edges_26:
        chamfer3.Add(CHAMFER3_SIZE, CHAMFER3_SIZE2, e.wrapped, chamfer3_side_26[0].wrapped)  # the first distance lies on this face
    for e in chamfer3_edges_27:
        chamfer3.Add(CHAMFER3_SIZE, CHAMFER3_SIZE2, e.wrapped, chamfer3_side_27[0].wrapped)  # the first distance lies on this face
    for e in chamfer3_edges_28:
        chamfer3.Add(CHAMFER3_SIZE, CHAMFER3_SIZE2, e.wrapped, chamfer3_side_28[0].wrapped)  # the first distance lies on this face
    for e in chamfer3_edges_29:
        chamfer3.Add(CHAMFER3_SIZE, CHAMFER3_SIZE2, e.wrapped, chamfer3_side_29[0].wrapped)  # the first distance lies on this face
    for e in chamfer3_edges_30:
        chamfer3.Add(CHAMFER3_SIZE, CHAMFER3_SIZE2, e.wrapped, chamfer3_side_30[0].wrapped)  # the first distance lies on this face
    for e in chamfer3_edges_31:
        chamfer3.Add(CHAMFER3_SIZE, CHAMFER3_SIZE2, e.wrapped, chamfer3_side_31[0].wrapped)  # the first distance lies on this face
    for e in chamfer3_edges_32:
        chamfer3.Add(CHAMFER3_SIZE, CHAMFER3_SIZE2, e.wrapped, chamfer3_side_32[0].wrapped)  # the first distance lies on this face
    add(Compound.cast(chamfer3.Shape()), mode=Mode.REPLACE)


solid = part.part
